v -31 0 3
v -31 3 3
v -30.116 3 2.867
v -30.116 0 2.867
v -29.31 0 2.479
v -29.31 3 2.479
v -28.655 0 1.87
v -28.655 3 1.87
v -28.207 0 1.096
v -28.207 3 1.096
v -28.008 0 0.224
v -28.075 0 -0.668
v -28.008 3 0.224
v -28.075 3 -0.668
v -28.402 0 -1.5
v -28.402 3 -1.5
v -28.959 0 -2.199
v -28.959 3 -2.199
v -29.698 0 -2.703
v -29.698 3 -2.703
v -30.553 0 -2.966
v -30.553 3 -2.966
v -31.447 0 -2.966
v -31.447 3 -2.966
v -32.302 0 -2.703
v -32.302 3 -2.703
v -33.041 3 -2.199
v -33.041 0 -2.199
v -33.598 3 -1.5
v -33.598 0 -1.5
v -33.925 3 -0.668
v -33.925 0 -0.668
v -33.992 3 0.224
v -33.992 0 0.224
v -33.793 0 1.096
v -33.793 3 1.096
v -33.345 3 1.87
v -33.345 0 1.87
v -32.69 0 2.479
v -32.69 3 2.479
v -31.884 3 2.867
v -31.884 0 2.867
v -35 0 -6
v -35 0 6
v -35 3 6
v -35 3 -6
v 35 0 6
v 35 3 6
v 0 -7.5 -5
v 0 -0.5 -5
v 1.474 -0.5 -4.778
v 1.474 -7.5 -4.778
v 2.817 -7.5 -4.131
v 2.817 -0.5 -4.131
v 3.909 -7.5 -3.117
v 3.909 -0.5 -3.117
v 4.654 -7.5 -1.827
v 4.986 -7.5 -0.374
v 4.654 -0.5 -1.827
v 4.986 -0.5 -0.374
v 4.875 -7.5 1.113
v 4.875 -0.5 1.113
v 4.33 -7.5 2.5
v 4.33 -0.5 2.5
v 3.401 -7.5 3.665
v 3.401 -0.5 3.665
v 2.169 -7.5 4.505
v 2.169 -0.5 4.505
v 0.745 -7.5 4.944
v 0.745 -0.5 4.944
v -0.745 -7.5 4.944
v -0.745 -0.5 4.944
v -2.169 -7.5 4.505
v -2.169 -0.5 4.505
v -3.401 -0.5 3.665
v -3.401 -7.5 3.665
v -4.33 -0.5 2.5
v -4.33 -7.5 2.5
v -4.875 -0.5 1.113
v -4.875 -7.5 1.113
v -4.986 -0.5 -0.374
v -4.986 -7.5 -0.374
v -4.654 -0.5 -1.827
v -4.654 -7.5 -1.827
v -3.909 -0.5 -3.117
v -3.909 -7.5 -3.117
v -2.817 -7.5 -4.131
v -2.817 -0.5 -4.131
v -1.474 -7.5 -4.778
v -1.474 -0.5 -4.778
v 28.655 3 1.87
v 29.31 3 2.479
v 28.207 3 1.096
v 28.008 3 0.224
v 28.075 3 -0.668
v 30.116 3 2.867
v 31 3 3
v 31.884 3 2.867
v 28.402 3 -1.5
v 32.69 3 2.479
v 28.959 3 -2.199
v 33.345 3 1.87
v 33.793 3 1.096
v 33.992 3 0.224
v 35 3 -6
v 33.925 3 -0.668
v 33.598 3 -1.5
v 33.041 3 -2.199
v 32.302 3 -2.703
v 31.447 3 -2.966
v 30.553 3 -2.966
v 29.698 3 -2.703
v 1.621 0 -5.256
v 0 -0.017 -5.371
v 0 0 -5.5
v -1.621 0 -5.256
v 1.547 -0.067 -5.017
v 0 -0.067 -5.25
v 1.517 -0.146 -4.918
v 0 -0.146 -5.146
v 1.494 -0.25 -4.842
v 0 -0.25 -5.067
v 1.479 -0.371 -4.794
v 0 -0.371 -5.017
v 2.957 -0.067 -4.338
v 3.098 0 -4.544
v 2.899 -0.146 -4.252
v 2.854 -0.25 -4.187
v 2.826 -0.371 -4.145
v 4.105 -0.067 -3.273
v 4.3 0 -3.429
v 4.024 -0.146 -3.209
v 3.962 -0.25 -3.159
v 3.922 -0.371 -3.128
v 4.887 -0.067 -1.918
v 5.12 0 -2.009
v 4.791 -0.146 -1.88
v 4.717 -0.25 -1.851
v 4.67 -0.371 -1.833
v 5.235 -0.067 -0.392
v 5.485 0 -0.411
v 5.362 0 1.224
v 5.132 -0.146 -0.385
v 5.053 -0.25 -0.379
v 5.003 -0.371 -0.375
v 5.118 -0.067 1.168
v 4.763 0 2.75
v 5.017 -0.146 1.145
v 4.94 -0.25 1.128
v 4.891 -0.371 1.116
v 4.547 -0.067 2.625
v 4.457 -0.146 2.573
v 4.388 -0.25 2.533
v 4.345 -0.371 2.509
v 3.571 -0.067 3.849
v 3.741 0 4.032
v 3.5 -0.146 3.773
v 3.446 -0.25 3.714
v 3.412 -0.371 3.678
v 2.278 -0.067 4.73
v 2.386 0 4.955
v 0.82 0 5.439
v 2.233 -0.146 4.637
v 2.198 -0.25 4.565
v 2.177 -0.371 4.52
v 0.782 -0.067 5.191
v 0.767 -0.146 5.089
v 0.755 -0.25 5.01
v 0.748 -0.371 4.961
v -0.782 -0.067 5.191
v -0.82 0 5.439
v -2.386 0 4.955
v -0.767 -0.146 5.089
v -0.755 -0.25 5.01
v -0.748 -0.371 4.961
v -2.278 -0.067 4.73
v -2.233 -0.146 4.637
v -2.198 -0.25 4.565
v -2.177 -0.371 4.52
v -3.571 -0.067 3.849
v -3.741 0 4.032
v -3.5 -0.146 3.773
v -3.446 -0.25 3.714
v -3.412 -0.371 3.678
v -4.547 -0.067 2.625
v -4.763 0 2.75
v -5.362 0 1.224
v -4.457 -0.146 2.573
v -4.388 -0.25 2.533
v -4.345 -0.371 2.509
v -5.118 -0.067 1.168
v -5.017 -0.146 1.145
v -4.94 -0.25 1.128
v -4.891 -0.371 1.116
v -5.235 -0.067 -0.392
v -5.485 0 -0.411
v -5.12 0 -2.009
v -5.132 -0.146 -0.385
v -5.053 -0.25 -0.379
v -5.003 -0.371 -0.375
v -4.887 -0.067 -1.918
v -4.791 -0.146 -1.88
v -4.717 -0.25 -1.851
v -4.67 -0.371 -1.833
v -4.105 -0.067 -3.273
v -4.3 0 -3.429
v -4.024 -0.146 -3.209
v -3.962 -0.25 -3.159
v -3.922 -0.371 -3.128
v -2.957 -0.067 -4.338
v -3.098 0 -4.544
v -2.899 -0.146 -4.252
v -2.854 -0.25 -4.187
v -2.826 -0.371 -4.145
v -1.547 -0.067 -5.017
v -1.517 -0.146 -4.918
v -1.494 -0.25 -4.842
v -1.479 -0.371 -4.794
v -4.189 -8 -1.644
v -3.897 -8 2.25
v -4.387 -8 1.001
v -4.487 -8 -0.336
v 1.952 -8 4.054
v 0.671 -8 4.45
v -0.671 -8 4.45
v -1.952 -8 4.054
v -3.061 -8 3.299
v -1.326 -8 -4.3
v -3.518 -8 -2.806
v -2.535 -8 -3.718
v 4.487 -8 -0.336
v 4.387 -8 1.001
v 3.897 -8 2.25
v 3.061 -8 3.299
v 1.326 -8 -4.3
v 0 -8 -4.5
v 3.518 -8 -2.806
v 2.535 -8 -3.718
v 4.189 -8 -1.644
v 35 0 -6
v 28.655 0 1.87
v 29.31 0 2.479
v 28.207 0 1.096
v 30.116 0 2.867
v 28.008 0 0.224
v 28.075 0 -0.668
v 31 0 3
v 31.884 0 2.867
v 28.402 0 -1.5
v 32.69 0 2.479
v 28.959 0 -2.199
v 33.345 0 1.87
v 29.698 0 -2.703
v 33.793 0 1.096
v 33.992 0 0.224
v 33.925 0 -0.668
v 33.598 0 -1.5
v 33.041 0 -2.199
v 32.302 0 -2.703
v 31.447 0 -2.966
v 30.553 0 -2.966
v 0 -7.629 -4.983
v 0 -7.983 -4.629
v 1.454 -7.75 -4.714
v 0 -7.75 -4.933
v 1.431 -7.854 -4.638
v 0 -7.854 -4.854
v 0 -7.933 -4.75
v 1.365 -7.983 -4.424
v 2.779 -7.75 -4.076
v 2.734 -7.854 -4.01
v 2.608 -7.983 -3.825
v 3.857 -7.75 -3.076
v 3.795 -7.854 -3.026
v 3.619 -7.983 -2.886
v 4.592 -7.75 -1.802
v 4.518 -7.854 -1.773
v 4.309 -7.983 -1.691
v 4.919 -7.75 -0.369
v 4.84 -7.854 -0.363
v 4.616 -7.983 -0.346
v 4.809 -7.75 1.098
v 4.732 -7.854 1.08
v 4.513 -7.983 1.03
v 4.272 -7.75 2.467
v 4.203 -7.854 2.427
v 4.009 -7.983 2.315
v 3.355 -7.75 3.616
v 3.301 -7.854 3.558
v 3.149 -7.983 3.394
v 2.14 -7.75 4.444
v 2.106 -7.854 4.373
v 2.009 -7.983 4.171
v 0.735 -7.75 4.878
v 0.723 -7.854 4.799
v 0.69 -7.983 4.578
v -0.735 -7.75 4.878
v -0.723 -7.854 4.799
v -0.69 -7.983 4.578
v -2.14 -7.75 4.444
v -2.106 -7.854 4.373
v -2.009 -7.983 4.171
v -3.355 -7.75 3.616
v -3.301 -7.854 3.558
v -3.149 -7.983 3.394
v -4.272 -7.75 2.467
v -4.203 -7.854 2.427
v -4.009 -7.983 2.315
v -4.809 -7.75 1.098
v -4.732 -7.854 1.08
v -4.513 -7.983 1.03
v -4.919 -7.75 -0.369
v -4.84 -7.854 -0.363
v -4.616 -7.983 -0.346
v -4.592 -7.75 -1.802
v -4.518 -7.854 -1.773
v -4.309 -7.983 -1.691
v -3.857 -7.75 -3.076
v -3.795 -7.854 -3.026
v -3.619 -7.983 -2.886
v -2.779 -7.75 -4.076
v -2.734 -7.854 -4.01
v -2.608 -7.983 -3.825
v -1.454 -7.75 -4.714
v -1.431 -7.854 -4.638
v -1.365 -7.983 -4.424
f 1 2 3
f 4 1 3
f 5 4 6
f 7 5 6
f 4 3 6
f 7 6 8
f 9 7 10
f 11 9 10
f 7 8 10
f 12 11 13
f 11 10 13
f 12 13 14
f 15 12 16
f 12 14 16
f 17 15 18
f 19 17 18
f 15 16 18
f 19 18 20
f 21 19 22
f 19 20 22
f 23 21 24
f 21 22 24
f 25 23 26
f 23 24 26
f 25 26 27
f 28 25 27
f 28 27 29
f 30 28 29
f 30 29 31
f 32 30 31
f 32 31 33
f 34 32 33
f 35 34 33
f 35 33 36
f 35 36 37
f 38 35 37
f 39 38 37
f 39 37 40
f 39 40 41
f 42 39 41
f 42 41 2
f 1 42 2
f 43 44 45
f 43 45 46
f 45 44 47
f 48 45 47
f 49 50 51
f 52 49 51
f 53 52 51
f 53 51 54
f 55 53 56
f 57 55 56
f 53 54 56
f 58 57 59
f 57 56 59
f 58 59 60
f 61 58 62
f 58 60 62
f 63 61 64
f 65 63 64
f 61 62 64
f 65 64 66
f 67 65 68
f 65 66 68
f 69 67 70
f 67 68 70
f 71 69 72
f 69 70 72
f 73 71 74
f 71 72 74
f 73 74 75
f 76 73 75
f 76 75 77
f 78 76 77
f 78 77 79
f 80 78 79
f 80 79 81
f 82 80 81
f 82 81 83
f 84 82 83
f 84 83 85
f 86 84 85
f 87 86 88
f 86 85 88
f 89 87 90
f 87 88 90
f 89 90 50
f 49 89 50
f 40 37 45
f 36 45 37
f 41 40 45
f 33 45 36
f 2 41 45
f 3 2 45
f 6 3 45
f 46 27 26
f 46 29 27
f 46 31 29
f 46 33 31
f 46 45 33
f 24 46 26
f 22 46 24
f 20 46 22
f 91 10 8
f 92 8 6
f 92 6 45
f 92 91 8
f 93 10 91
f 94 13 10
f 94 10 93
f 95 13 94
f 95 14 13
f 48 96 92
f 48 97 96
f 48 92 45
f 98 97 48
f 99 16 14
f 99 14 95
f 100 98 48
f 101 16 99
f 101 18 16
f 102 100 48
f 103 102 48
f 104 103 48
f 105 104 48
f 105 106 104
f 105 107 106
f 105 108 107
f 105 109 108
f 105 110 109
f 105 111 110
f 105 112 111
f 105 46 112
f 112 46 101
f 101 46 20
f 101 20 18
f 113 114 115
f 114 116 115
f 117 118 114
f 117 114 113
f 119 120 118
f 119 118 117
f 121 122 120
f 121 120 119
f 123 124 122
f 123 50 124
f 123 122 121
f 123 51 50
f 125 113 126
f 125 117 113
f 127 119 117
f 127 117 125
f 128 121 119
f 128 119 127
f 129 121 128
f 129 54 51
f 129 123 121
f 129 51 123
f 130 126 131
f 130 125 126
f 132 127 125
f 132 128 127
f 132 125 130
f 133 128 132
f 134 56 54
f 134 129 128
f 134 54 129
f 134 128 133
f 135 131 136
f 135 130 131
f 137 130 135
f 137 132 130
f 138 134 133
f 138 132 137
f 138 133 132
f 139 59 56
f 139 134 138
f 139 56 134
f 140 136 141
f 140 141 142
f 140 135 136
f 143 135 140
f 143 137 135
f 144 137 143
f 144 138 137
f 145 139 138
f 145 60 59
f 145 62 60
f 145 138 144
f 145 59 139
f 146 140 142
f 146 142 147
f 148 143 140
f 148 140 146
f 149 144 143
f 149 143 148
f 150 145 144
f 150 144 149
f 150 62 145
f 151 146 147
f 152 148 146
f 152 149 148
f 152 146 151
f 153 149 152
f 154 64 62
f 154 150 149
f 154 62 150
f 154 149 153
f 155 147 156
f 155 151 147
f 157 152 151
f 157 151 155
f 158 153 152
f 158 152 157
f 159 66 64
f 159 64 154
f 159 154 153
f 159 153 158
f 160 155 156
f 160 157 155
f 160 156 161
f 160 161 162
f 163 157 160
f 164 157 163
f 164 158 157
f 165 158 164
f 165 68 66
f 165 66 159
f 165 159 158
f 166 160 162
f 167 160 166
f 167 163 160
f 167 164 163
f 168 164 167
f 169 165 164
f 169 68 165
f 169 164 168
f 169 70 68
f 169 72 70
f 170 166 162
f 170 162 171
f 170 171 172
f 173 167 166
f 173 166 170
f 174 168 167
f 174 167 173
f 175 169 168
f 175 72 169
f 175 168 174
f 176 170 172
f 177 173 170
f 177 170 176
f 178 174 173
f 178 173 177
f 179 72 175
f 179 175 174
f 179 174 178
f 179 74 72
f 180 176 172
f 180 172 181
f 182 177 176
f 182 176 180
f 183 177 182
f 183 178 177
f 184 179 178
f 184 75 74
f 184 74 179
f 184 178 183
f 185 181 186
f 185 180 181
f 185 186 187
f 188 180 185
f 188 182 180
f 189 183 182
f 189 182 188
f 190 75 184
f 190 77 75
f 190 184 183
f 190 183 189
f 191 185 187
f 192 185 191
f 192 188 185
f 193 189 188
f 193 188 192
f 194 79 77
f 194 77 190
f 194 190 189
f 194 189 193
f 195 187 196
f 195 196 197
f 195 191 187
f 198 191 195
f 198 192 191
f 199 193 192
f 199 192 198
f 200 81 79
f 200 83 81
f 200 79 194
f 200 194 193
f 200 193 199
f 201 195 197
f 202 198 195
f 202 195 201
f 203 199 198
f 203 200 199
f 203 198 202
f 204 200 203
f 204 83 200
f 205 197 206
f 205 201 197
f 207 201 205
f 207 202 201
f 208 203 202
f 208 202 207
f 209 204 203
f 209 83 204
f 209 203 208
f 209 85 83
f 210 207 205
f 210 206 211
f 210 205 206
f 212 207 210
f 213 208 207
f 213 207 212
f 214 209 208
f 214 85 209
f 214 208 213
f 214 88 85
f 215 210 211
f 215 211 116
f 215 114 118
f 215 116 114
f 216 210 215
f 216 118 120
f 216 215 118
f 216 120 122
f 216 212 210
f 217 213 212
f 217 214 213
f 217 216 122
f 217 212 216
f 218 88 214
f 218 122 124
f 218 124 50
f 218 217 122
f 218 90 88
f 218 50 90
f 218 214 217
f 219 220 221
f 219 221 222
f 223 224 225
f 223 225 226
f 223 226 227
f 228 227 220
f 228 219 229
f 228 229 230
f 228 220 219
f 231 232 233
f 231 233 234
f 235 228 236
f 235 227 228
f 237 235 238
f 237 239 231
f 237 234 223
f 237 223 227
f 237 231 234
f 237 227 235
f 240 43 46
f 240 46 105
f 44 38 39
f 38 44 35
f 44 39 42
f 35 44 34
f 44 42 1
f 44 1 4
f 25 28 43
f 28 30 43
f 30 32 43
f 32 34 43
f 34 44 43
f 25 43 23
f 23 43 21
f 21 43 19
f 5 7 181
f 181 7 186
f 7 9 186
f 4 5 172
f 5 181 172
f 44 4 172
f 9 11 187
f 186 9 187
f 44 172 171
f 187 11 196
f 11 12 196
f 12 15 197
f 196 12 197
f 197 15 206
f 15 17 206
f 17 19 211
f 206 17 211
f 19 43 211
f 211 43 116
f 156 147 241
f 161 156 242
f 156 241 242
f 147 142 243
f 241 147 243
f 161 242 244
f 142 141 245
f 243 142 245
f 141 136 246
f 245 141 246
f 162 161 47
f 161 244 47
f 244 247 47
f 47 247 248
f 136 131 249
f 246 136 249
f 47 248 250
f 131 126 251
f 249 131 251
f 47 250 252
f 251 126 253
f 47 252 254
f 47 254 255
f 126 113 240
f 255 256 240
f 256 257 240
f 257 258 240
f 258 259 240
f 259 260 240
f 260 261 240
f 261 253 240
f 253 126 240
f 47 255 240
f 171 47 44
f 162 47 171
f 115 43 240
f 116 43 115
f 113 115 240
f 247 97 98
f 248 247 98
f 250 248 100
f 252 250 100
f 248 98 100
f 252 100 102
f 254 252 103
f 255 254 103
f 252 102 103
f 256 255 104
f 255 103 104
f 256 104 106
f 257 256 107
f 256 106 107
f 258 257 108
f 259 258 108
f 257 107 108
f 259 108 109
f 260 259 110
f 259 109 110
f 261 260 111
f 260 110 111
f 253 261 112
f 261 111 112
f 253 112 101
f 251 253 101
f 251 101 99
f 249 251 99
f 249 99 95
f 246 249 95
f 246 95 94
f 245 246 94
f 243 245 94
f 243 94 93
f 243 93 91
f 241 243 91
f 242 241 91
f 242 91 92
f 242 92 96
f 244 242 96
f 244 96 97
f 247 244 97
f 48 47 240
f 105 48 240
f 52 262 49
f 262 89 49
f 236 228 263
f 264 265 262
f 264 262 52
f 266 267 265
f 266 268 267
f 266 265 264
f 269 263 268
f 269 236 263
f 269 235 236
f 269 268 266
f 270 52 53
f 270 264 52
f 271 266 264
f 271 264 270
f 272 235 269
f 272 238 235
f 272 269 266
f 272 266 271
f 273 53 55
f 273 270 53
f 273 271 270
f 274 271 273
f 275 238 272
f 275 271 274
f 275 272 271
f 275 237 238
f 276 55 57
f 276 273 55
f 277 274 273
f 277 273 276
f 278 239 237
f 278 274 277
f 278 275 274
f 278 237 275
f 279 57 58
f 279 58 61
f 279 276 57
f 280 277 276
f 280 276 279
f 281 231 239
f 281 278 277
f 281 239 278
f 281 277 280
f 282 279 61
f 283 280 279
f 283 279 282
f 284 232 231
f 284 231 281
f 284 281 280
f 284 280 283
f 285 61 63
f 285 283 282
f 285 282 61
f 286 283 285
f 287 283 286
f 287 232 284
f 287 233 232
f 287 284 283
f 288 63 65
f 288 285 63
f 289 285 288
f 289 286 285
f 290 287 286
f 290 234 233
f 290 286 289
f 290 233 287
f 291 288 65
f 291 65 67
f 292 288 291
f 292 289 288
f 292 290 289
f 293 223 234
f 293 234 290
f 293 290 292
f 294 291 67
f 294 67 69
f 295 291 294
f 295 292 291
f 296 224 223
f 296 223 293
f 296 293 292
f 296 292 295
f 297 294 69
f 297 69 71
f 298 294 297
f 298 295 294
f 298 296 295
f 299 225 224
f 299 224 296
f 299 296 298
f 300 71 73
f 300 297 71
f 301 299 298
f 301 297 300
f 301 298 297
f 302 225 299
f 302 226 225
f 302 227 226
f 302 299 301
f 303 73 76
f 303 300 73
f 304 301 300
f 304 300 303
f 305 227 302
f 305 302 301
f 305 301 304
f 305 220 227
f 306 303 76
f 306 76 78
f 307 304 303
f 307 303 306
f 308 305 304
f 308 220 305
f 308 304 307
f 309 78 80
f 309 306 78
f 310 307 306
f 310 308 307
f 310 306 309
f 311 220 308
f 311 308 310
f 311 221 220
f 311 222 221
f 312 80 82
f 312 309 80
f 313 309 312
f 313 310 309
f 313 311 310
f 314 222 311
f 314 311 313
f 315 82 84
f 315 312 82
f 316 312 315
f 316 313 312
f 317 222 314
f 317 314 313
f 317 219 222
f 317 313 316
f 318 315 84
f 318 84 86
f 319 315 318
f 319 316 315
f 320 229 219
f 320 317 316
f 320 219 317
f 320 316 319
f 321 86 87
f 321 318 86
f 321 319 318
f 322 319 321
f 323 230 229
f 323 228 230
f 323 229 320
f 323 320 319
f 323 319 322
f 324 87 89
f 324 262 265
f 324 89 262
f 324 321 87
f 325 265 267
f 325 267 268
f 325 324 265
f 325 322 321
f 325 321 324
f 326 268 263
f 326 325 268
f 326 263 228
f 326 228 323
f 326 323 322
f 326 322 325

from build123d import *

# Parameters (mm, degrees)
SKETCH1_W           = 70
SKETCH1_H           = 12
BOSS_EXTRUDE1_DEPTH = 3
SKETCH3_R           = 3
CUT_EXTRUDE1_DEPTH  = 36.637059362
SKETCH4_R           = 5
BOSS_EXTRUDE2_DEPTH = 8
FILLET2_R           = 0.5


with BuildPart() as part:
    # Sketch1 → Boss-Extrude1 (new body)
    with BuildSketch(Plane(origin=(0, 0, 0), x_dir=(1, 0, 0), z_dir=(0, 1, 0))):
        Rectangle(SKETCH1_W, SKETCH1_H)
    extrude(amount=BOSS_EXTRUDE1_DEPTH)

    # Sketch3 → Cut-Extrude1 (cut, through all)
    with BuildSketch(Plane(origin=(0, 3, 0), x_dir=(1, 0, 0), z_dir=(0, 1, 0))):
        with Locations(Location((-31, 0, 0), (0, 0, 270))):
            Circle(SKETCH3_R)
        with Locations(Location((31, 0, 0), (0, 0, 270))):
            Circle(SKETCH3_R)
    extrude(amount=-CUT_EXTRUDE1_DEPTH, mode=Mode.SUBTRACT)

    # Sketch4 → Boss-Extrude2 (add)
    with BuildSketch(Plane.XZ):
        with Locations(Location((0, 0, 0), (0, 0, 270))):
            Circle(SKETCH4_R)
    extrude(amount=BOSS_EXTRUDE2_DEPTH)

    # Fillet2
    fillet2_edges = [part.edges().sort_by_distance(p)[0] for p in [
        (0, 0, 5),
        (0, -8, 5),
    ]]
    fillet(fillet2_edges, radius=FILLET2_R)


solid = part.part
